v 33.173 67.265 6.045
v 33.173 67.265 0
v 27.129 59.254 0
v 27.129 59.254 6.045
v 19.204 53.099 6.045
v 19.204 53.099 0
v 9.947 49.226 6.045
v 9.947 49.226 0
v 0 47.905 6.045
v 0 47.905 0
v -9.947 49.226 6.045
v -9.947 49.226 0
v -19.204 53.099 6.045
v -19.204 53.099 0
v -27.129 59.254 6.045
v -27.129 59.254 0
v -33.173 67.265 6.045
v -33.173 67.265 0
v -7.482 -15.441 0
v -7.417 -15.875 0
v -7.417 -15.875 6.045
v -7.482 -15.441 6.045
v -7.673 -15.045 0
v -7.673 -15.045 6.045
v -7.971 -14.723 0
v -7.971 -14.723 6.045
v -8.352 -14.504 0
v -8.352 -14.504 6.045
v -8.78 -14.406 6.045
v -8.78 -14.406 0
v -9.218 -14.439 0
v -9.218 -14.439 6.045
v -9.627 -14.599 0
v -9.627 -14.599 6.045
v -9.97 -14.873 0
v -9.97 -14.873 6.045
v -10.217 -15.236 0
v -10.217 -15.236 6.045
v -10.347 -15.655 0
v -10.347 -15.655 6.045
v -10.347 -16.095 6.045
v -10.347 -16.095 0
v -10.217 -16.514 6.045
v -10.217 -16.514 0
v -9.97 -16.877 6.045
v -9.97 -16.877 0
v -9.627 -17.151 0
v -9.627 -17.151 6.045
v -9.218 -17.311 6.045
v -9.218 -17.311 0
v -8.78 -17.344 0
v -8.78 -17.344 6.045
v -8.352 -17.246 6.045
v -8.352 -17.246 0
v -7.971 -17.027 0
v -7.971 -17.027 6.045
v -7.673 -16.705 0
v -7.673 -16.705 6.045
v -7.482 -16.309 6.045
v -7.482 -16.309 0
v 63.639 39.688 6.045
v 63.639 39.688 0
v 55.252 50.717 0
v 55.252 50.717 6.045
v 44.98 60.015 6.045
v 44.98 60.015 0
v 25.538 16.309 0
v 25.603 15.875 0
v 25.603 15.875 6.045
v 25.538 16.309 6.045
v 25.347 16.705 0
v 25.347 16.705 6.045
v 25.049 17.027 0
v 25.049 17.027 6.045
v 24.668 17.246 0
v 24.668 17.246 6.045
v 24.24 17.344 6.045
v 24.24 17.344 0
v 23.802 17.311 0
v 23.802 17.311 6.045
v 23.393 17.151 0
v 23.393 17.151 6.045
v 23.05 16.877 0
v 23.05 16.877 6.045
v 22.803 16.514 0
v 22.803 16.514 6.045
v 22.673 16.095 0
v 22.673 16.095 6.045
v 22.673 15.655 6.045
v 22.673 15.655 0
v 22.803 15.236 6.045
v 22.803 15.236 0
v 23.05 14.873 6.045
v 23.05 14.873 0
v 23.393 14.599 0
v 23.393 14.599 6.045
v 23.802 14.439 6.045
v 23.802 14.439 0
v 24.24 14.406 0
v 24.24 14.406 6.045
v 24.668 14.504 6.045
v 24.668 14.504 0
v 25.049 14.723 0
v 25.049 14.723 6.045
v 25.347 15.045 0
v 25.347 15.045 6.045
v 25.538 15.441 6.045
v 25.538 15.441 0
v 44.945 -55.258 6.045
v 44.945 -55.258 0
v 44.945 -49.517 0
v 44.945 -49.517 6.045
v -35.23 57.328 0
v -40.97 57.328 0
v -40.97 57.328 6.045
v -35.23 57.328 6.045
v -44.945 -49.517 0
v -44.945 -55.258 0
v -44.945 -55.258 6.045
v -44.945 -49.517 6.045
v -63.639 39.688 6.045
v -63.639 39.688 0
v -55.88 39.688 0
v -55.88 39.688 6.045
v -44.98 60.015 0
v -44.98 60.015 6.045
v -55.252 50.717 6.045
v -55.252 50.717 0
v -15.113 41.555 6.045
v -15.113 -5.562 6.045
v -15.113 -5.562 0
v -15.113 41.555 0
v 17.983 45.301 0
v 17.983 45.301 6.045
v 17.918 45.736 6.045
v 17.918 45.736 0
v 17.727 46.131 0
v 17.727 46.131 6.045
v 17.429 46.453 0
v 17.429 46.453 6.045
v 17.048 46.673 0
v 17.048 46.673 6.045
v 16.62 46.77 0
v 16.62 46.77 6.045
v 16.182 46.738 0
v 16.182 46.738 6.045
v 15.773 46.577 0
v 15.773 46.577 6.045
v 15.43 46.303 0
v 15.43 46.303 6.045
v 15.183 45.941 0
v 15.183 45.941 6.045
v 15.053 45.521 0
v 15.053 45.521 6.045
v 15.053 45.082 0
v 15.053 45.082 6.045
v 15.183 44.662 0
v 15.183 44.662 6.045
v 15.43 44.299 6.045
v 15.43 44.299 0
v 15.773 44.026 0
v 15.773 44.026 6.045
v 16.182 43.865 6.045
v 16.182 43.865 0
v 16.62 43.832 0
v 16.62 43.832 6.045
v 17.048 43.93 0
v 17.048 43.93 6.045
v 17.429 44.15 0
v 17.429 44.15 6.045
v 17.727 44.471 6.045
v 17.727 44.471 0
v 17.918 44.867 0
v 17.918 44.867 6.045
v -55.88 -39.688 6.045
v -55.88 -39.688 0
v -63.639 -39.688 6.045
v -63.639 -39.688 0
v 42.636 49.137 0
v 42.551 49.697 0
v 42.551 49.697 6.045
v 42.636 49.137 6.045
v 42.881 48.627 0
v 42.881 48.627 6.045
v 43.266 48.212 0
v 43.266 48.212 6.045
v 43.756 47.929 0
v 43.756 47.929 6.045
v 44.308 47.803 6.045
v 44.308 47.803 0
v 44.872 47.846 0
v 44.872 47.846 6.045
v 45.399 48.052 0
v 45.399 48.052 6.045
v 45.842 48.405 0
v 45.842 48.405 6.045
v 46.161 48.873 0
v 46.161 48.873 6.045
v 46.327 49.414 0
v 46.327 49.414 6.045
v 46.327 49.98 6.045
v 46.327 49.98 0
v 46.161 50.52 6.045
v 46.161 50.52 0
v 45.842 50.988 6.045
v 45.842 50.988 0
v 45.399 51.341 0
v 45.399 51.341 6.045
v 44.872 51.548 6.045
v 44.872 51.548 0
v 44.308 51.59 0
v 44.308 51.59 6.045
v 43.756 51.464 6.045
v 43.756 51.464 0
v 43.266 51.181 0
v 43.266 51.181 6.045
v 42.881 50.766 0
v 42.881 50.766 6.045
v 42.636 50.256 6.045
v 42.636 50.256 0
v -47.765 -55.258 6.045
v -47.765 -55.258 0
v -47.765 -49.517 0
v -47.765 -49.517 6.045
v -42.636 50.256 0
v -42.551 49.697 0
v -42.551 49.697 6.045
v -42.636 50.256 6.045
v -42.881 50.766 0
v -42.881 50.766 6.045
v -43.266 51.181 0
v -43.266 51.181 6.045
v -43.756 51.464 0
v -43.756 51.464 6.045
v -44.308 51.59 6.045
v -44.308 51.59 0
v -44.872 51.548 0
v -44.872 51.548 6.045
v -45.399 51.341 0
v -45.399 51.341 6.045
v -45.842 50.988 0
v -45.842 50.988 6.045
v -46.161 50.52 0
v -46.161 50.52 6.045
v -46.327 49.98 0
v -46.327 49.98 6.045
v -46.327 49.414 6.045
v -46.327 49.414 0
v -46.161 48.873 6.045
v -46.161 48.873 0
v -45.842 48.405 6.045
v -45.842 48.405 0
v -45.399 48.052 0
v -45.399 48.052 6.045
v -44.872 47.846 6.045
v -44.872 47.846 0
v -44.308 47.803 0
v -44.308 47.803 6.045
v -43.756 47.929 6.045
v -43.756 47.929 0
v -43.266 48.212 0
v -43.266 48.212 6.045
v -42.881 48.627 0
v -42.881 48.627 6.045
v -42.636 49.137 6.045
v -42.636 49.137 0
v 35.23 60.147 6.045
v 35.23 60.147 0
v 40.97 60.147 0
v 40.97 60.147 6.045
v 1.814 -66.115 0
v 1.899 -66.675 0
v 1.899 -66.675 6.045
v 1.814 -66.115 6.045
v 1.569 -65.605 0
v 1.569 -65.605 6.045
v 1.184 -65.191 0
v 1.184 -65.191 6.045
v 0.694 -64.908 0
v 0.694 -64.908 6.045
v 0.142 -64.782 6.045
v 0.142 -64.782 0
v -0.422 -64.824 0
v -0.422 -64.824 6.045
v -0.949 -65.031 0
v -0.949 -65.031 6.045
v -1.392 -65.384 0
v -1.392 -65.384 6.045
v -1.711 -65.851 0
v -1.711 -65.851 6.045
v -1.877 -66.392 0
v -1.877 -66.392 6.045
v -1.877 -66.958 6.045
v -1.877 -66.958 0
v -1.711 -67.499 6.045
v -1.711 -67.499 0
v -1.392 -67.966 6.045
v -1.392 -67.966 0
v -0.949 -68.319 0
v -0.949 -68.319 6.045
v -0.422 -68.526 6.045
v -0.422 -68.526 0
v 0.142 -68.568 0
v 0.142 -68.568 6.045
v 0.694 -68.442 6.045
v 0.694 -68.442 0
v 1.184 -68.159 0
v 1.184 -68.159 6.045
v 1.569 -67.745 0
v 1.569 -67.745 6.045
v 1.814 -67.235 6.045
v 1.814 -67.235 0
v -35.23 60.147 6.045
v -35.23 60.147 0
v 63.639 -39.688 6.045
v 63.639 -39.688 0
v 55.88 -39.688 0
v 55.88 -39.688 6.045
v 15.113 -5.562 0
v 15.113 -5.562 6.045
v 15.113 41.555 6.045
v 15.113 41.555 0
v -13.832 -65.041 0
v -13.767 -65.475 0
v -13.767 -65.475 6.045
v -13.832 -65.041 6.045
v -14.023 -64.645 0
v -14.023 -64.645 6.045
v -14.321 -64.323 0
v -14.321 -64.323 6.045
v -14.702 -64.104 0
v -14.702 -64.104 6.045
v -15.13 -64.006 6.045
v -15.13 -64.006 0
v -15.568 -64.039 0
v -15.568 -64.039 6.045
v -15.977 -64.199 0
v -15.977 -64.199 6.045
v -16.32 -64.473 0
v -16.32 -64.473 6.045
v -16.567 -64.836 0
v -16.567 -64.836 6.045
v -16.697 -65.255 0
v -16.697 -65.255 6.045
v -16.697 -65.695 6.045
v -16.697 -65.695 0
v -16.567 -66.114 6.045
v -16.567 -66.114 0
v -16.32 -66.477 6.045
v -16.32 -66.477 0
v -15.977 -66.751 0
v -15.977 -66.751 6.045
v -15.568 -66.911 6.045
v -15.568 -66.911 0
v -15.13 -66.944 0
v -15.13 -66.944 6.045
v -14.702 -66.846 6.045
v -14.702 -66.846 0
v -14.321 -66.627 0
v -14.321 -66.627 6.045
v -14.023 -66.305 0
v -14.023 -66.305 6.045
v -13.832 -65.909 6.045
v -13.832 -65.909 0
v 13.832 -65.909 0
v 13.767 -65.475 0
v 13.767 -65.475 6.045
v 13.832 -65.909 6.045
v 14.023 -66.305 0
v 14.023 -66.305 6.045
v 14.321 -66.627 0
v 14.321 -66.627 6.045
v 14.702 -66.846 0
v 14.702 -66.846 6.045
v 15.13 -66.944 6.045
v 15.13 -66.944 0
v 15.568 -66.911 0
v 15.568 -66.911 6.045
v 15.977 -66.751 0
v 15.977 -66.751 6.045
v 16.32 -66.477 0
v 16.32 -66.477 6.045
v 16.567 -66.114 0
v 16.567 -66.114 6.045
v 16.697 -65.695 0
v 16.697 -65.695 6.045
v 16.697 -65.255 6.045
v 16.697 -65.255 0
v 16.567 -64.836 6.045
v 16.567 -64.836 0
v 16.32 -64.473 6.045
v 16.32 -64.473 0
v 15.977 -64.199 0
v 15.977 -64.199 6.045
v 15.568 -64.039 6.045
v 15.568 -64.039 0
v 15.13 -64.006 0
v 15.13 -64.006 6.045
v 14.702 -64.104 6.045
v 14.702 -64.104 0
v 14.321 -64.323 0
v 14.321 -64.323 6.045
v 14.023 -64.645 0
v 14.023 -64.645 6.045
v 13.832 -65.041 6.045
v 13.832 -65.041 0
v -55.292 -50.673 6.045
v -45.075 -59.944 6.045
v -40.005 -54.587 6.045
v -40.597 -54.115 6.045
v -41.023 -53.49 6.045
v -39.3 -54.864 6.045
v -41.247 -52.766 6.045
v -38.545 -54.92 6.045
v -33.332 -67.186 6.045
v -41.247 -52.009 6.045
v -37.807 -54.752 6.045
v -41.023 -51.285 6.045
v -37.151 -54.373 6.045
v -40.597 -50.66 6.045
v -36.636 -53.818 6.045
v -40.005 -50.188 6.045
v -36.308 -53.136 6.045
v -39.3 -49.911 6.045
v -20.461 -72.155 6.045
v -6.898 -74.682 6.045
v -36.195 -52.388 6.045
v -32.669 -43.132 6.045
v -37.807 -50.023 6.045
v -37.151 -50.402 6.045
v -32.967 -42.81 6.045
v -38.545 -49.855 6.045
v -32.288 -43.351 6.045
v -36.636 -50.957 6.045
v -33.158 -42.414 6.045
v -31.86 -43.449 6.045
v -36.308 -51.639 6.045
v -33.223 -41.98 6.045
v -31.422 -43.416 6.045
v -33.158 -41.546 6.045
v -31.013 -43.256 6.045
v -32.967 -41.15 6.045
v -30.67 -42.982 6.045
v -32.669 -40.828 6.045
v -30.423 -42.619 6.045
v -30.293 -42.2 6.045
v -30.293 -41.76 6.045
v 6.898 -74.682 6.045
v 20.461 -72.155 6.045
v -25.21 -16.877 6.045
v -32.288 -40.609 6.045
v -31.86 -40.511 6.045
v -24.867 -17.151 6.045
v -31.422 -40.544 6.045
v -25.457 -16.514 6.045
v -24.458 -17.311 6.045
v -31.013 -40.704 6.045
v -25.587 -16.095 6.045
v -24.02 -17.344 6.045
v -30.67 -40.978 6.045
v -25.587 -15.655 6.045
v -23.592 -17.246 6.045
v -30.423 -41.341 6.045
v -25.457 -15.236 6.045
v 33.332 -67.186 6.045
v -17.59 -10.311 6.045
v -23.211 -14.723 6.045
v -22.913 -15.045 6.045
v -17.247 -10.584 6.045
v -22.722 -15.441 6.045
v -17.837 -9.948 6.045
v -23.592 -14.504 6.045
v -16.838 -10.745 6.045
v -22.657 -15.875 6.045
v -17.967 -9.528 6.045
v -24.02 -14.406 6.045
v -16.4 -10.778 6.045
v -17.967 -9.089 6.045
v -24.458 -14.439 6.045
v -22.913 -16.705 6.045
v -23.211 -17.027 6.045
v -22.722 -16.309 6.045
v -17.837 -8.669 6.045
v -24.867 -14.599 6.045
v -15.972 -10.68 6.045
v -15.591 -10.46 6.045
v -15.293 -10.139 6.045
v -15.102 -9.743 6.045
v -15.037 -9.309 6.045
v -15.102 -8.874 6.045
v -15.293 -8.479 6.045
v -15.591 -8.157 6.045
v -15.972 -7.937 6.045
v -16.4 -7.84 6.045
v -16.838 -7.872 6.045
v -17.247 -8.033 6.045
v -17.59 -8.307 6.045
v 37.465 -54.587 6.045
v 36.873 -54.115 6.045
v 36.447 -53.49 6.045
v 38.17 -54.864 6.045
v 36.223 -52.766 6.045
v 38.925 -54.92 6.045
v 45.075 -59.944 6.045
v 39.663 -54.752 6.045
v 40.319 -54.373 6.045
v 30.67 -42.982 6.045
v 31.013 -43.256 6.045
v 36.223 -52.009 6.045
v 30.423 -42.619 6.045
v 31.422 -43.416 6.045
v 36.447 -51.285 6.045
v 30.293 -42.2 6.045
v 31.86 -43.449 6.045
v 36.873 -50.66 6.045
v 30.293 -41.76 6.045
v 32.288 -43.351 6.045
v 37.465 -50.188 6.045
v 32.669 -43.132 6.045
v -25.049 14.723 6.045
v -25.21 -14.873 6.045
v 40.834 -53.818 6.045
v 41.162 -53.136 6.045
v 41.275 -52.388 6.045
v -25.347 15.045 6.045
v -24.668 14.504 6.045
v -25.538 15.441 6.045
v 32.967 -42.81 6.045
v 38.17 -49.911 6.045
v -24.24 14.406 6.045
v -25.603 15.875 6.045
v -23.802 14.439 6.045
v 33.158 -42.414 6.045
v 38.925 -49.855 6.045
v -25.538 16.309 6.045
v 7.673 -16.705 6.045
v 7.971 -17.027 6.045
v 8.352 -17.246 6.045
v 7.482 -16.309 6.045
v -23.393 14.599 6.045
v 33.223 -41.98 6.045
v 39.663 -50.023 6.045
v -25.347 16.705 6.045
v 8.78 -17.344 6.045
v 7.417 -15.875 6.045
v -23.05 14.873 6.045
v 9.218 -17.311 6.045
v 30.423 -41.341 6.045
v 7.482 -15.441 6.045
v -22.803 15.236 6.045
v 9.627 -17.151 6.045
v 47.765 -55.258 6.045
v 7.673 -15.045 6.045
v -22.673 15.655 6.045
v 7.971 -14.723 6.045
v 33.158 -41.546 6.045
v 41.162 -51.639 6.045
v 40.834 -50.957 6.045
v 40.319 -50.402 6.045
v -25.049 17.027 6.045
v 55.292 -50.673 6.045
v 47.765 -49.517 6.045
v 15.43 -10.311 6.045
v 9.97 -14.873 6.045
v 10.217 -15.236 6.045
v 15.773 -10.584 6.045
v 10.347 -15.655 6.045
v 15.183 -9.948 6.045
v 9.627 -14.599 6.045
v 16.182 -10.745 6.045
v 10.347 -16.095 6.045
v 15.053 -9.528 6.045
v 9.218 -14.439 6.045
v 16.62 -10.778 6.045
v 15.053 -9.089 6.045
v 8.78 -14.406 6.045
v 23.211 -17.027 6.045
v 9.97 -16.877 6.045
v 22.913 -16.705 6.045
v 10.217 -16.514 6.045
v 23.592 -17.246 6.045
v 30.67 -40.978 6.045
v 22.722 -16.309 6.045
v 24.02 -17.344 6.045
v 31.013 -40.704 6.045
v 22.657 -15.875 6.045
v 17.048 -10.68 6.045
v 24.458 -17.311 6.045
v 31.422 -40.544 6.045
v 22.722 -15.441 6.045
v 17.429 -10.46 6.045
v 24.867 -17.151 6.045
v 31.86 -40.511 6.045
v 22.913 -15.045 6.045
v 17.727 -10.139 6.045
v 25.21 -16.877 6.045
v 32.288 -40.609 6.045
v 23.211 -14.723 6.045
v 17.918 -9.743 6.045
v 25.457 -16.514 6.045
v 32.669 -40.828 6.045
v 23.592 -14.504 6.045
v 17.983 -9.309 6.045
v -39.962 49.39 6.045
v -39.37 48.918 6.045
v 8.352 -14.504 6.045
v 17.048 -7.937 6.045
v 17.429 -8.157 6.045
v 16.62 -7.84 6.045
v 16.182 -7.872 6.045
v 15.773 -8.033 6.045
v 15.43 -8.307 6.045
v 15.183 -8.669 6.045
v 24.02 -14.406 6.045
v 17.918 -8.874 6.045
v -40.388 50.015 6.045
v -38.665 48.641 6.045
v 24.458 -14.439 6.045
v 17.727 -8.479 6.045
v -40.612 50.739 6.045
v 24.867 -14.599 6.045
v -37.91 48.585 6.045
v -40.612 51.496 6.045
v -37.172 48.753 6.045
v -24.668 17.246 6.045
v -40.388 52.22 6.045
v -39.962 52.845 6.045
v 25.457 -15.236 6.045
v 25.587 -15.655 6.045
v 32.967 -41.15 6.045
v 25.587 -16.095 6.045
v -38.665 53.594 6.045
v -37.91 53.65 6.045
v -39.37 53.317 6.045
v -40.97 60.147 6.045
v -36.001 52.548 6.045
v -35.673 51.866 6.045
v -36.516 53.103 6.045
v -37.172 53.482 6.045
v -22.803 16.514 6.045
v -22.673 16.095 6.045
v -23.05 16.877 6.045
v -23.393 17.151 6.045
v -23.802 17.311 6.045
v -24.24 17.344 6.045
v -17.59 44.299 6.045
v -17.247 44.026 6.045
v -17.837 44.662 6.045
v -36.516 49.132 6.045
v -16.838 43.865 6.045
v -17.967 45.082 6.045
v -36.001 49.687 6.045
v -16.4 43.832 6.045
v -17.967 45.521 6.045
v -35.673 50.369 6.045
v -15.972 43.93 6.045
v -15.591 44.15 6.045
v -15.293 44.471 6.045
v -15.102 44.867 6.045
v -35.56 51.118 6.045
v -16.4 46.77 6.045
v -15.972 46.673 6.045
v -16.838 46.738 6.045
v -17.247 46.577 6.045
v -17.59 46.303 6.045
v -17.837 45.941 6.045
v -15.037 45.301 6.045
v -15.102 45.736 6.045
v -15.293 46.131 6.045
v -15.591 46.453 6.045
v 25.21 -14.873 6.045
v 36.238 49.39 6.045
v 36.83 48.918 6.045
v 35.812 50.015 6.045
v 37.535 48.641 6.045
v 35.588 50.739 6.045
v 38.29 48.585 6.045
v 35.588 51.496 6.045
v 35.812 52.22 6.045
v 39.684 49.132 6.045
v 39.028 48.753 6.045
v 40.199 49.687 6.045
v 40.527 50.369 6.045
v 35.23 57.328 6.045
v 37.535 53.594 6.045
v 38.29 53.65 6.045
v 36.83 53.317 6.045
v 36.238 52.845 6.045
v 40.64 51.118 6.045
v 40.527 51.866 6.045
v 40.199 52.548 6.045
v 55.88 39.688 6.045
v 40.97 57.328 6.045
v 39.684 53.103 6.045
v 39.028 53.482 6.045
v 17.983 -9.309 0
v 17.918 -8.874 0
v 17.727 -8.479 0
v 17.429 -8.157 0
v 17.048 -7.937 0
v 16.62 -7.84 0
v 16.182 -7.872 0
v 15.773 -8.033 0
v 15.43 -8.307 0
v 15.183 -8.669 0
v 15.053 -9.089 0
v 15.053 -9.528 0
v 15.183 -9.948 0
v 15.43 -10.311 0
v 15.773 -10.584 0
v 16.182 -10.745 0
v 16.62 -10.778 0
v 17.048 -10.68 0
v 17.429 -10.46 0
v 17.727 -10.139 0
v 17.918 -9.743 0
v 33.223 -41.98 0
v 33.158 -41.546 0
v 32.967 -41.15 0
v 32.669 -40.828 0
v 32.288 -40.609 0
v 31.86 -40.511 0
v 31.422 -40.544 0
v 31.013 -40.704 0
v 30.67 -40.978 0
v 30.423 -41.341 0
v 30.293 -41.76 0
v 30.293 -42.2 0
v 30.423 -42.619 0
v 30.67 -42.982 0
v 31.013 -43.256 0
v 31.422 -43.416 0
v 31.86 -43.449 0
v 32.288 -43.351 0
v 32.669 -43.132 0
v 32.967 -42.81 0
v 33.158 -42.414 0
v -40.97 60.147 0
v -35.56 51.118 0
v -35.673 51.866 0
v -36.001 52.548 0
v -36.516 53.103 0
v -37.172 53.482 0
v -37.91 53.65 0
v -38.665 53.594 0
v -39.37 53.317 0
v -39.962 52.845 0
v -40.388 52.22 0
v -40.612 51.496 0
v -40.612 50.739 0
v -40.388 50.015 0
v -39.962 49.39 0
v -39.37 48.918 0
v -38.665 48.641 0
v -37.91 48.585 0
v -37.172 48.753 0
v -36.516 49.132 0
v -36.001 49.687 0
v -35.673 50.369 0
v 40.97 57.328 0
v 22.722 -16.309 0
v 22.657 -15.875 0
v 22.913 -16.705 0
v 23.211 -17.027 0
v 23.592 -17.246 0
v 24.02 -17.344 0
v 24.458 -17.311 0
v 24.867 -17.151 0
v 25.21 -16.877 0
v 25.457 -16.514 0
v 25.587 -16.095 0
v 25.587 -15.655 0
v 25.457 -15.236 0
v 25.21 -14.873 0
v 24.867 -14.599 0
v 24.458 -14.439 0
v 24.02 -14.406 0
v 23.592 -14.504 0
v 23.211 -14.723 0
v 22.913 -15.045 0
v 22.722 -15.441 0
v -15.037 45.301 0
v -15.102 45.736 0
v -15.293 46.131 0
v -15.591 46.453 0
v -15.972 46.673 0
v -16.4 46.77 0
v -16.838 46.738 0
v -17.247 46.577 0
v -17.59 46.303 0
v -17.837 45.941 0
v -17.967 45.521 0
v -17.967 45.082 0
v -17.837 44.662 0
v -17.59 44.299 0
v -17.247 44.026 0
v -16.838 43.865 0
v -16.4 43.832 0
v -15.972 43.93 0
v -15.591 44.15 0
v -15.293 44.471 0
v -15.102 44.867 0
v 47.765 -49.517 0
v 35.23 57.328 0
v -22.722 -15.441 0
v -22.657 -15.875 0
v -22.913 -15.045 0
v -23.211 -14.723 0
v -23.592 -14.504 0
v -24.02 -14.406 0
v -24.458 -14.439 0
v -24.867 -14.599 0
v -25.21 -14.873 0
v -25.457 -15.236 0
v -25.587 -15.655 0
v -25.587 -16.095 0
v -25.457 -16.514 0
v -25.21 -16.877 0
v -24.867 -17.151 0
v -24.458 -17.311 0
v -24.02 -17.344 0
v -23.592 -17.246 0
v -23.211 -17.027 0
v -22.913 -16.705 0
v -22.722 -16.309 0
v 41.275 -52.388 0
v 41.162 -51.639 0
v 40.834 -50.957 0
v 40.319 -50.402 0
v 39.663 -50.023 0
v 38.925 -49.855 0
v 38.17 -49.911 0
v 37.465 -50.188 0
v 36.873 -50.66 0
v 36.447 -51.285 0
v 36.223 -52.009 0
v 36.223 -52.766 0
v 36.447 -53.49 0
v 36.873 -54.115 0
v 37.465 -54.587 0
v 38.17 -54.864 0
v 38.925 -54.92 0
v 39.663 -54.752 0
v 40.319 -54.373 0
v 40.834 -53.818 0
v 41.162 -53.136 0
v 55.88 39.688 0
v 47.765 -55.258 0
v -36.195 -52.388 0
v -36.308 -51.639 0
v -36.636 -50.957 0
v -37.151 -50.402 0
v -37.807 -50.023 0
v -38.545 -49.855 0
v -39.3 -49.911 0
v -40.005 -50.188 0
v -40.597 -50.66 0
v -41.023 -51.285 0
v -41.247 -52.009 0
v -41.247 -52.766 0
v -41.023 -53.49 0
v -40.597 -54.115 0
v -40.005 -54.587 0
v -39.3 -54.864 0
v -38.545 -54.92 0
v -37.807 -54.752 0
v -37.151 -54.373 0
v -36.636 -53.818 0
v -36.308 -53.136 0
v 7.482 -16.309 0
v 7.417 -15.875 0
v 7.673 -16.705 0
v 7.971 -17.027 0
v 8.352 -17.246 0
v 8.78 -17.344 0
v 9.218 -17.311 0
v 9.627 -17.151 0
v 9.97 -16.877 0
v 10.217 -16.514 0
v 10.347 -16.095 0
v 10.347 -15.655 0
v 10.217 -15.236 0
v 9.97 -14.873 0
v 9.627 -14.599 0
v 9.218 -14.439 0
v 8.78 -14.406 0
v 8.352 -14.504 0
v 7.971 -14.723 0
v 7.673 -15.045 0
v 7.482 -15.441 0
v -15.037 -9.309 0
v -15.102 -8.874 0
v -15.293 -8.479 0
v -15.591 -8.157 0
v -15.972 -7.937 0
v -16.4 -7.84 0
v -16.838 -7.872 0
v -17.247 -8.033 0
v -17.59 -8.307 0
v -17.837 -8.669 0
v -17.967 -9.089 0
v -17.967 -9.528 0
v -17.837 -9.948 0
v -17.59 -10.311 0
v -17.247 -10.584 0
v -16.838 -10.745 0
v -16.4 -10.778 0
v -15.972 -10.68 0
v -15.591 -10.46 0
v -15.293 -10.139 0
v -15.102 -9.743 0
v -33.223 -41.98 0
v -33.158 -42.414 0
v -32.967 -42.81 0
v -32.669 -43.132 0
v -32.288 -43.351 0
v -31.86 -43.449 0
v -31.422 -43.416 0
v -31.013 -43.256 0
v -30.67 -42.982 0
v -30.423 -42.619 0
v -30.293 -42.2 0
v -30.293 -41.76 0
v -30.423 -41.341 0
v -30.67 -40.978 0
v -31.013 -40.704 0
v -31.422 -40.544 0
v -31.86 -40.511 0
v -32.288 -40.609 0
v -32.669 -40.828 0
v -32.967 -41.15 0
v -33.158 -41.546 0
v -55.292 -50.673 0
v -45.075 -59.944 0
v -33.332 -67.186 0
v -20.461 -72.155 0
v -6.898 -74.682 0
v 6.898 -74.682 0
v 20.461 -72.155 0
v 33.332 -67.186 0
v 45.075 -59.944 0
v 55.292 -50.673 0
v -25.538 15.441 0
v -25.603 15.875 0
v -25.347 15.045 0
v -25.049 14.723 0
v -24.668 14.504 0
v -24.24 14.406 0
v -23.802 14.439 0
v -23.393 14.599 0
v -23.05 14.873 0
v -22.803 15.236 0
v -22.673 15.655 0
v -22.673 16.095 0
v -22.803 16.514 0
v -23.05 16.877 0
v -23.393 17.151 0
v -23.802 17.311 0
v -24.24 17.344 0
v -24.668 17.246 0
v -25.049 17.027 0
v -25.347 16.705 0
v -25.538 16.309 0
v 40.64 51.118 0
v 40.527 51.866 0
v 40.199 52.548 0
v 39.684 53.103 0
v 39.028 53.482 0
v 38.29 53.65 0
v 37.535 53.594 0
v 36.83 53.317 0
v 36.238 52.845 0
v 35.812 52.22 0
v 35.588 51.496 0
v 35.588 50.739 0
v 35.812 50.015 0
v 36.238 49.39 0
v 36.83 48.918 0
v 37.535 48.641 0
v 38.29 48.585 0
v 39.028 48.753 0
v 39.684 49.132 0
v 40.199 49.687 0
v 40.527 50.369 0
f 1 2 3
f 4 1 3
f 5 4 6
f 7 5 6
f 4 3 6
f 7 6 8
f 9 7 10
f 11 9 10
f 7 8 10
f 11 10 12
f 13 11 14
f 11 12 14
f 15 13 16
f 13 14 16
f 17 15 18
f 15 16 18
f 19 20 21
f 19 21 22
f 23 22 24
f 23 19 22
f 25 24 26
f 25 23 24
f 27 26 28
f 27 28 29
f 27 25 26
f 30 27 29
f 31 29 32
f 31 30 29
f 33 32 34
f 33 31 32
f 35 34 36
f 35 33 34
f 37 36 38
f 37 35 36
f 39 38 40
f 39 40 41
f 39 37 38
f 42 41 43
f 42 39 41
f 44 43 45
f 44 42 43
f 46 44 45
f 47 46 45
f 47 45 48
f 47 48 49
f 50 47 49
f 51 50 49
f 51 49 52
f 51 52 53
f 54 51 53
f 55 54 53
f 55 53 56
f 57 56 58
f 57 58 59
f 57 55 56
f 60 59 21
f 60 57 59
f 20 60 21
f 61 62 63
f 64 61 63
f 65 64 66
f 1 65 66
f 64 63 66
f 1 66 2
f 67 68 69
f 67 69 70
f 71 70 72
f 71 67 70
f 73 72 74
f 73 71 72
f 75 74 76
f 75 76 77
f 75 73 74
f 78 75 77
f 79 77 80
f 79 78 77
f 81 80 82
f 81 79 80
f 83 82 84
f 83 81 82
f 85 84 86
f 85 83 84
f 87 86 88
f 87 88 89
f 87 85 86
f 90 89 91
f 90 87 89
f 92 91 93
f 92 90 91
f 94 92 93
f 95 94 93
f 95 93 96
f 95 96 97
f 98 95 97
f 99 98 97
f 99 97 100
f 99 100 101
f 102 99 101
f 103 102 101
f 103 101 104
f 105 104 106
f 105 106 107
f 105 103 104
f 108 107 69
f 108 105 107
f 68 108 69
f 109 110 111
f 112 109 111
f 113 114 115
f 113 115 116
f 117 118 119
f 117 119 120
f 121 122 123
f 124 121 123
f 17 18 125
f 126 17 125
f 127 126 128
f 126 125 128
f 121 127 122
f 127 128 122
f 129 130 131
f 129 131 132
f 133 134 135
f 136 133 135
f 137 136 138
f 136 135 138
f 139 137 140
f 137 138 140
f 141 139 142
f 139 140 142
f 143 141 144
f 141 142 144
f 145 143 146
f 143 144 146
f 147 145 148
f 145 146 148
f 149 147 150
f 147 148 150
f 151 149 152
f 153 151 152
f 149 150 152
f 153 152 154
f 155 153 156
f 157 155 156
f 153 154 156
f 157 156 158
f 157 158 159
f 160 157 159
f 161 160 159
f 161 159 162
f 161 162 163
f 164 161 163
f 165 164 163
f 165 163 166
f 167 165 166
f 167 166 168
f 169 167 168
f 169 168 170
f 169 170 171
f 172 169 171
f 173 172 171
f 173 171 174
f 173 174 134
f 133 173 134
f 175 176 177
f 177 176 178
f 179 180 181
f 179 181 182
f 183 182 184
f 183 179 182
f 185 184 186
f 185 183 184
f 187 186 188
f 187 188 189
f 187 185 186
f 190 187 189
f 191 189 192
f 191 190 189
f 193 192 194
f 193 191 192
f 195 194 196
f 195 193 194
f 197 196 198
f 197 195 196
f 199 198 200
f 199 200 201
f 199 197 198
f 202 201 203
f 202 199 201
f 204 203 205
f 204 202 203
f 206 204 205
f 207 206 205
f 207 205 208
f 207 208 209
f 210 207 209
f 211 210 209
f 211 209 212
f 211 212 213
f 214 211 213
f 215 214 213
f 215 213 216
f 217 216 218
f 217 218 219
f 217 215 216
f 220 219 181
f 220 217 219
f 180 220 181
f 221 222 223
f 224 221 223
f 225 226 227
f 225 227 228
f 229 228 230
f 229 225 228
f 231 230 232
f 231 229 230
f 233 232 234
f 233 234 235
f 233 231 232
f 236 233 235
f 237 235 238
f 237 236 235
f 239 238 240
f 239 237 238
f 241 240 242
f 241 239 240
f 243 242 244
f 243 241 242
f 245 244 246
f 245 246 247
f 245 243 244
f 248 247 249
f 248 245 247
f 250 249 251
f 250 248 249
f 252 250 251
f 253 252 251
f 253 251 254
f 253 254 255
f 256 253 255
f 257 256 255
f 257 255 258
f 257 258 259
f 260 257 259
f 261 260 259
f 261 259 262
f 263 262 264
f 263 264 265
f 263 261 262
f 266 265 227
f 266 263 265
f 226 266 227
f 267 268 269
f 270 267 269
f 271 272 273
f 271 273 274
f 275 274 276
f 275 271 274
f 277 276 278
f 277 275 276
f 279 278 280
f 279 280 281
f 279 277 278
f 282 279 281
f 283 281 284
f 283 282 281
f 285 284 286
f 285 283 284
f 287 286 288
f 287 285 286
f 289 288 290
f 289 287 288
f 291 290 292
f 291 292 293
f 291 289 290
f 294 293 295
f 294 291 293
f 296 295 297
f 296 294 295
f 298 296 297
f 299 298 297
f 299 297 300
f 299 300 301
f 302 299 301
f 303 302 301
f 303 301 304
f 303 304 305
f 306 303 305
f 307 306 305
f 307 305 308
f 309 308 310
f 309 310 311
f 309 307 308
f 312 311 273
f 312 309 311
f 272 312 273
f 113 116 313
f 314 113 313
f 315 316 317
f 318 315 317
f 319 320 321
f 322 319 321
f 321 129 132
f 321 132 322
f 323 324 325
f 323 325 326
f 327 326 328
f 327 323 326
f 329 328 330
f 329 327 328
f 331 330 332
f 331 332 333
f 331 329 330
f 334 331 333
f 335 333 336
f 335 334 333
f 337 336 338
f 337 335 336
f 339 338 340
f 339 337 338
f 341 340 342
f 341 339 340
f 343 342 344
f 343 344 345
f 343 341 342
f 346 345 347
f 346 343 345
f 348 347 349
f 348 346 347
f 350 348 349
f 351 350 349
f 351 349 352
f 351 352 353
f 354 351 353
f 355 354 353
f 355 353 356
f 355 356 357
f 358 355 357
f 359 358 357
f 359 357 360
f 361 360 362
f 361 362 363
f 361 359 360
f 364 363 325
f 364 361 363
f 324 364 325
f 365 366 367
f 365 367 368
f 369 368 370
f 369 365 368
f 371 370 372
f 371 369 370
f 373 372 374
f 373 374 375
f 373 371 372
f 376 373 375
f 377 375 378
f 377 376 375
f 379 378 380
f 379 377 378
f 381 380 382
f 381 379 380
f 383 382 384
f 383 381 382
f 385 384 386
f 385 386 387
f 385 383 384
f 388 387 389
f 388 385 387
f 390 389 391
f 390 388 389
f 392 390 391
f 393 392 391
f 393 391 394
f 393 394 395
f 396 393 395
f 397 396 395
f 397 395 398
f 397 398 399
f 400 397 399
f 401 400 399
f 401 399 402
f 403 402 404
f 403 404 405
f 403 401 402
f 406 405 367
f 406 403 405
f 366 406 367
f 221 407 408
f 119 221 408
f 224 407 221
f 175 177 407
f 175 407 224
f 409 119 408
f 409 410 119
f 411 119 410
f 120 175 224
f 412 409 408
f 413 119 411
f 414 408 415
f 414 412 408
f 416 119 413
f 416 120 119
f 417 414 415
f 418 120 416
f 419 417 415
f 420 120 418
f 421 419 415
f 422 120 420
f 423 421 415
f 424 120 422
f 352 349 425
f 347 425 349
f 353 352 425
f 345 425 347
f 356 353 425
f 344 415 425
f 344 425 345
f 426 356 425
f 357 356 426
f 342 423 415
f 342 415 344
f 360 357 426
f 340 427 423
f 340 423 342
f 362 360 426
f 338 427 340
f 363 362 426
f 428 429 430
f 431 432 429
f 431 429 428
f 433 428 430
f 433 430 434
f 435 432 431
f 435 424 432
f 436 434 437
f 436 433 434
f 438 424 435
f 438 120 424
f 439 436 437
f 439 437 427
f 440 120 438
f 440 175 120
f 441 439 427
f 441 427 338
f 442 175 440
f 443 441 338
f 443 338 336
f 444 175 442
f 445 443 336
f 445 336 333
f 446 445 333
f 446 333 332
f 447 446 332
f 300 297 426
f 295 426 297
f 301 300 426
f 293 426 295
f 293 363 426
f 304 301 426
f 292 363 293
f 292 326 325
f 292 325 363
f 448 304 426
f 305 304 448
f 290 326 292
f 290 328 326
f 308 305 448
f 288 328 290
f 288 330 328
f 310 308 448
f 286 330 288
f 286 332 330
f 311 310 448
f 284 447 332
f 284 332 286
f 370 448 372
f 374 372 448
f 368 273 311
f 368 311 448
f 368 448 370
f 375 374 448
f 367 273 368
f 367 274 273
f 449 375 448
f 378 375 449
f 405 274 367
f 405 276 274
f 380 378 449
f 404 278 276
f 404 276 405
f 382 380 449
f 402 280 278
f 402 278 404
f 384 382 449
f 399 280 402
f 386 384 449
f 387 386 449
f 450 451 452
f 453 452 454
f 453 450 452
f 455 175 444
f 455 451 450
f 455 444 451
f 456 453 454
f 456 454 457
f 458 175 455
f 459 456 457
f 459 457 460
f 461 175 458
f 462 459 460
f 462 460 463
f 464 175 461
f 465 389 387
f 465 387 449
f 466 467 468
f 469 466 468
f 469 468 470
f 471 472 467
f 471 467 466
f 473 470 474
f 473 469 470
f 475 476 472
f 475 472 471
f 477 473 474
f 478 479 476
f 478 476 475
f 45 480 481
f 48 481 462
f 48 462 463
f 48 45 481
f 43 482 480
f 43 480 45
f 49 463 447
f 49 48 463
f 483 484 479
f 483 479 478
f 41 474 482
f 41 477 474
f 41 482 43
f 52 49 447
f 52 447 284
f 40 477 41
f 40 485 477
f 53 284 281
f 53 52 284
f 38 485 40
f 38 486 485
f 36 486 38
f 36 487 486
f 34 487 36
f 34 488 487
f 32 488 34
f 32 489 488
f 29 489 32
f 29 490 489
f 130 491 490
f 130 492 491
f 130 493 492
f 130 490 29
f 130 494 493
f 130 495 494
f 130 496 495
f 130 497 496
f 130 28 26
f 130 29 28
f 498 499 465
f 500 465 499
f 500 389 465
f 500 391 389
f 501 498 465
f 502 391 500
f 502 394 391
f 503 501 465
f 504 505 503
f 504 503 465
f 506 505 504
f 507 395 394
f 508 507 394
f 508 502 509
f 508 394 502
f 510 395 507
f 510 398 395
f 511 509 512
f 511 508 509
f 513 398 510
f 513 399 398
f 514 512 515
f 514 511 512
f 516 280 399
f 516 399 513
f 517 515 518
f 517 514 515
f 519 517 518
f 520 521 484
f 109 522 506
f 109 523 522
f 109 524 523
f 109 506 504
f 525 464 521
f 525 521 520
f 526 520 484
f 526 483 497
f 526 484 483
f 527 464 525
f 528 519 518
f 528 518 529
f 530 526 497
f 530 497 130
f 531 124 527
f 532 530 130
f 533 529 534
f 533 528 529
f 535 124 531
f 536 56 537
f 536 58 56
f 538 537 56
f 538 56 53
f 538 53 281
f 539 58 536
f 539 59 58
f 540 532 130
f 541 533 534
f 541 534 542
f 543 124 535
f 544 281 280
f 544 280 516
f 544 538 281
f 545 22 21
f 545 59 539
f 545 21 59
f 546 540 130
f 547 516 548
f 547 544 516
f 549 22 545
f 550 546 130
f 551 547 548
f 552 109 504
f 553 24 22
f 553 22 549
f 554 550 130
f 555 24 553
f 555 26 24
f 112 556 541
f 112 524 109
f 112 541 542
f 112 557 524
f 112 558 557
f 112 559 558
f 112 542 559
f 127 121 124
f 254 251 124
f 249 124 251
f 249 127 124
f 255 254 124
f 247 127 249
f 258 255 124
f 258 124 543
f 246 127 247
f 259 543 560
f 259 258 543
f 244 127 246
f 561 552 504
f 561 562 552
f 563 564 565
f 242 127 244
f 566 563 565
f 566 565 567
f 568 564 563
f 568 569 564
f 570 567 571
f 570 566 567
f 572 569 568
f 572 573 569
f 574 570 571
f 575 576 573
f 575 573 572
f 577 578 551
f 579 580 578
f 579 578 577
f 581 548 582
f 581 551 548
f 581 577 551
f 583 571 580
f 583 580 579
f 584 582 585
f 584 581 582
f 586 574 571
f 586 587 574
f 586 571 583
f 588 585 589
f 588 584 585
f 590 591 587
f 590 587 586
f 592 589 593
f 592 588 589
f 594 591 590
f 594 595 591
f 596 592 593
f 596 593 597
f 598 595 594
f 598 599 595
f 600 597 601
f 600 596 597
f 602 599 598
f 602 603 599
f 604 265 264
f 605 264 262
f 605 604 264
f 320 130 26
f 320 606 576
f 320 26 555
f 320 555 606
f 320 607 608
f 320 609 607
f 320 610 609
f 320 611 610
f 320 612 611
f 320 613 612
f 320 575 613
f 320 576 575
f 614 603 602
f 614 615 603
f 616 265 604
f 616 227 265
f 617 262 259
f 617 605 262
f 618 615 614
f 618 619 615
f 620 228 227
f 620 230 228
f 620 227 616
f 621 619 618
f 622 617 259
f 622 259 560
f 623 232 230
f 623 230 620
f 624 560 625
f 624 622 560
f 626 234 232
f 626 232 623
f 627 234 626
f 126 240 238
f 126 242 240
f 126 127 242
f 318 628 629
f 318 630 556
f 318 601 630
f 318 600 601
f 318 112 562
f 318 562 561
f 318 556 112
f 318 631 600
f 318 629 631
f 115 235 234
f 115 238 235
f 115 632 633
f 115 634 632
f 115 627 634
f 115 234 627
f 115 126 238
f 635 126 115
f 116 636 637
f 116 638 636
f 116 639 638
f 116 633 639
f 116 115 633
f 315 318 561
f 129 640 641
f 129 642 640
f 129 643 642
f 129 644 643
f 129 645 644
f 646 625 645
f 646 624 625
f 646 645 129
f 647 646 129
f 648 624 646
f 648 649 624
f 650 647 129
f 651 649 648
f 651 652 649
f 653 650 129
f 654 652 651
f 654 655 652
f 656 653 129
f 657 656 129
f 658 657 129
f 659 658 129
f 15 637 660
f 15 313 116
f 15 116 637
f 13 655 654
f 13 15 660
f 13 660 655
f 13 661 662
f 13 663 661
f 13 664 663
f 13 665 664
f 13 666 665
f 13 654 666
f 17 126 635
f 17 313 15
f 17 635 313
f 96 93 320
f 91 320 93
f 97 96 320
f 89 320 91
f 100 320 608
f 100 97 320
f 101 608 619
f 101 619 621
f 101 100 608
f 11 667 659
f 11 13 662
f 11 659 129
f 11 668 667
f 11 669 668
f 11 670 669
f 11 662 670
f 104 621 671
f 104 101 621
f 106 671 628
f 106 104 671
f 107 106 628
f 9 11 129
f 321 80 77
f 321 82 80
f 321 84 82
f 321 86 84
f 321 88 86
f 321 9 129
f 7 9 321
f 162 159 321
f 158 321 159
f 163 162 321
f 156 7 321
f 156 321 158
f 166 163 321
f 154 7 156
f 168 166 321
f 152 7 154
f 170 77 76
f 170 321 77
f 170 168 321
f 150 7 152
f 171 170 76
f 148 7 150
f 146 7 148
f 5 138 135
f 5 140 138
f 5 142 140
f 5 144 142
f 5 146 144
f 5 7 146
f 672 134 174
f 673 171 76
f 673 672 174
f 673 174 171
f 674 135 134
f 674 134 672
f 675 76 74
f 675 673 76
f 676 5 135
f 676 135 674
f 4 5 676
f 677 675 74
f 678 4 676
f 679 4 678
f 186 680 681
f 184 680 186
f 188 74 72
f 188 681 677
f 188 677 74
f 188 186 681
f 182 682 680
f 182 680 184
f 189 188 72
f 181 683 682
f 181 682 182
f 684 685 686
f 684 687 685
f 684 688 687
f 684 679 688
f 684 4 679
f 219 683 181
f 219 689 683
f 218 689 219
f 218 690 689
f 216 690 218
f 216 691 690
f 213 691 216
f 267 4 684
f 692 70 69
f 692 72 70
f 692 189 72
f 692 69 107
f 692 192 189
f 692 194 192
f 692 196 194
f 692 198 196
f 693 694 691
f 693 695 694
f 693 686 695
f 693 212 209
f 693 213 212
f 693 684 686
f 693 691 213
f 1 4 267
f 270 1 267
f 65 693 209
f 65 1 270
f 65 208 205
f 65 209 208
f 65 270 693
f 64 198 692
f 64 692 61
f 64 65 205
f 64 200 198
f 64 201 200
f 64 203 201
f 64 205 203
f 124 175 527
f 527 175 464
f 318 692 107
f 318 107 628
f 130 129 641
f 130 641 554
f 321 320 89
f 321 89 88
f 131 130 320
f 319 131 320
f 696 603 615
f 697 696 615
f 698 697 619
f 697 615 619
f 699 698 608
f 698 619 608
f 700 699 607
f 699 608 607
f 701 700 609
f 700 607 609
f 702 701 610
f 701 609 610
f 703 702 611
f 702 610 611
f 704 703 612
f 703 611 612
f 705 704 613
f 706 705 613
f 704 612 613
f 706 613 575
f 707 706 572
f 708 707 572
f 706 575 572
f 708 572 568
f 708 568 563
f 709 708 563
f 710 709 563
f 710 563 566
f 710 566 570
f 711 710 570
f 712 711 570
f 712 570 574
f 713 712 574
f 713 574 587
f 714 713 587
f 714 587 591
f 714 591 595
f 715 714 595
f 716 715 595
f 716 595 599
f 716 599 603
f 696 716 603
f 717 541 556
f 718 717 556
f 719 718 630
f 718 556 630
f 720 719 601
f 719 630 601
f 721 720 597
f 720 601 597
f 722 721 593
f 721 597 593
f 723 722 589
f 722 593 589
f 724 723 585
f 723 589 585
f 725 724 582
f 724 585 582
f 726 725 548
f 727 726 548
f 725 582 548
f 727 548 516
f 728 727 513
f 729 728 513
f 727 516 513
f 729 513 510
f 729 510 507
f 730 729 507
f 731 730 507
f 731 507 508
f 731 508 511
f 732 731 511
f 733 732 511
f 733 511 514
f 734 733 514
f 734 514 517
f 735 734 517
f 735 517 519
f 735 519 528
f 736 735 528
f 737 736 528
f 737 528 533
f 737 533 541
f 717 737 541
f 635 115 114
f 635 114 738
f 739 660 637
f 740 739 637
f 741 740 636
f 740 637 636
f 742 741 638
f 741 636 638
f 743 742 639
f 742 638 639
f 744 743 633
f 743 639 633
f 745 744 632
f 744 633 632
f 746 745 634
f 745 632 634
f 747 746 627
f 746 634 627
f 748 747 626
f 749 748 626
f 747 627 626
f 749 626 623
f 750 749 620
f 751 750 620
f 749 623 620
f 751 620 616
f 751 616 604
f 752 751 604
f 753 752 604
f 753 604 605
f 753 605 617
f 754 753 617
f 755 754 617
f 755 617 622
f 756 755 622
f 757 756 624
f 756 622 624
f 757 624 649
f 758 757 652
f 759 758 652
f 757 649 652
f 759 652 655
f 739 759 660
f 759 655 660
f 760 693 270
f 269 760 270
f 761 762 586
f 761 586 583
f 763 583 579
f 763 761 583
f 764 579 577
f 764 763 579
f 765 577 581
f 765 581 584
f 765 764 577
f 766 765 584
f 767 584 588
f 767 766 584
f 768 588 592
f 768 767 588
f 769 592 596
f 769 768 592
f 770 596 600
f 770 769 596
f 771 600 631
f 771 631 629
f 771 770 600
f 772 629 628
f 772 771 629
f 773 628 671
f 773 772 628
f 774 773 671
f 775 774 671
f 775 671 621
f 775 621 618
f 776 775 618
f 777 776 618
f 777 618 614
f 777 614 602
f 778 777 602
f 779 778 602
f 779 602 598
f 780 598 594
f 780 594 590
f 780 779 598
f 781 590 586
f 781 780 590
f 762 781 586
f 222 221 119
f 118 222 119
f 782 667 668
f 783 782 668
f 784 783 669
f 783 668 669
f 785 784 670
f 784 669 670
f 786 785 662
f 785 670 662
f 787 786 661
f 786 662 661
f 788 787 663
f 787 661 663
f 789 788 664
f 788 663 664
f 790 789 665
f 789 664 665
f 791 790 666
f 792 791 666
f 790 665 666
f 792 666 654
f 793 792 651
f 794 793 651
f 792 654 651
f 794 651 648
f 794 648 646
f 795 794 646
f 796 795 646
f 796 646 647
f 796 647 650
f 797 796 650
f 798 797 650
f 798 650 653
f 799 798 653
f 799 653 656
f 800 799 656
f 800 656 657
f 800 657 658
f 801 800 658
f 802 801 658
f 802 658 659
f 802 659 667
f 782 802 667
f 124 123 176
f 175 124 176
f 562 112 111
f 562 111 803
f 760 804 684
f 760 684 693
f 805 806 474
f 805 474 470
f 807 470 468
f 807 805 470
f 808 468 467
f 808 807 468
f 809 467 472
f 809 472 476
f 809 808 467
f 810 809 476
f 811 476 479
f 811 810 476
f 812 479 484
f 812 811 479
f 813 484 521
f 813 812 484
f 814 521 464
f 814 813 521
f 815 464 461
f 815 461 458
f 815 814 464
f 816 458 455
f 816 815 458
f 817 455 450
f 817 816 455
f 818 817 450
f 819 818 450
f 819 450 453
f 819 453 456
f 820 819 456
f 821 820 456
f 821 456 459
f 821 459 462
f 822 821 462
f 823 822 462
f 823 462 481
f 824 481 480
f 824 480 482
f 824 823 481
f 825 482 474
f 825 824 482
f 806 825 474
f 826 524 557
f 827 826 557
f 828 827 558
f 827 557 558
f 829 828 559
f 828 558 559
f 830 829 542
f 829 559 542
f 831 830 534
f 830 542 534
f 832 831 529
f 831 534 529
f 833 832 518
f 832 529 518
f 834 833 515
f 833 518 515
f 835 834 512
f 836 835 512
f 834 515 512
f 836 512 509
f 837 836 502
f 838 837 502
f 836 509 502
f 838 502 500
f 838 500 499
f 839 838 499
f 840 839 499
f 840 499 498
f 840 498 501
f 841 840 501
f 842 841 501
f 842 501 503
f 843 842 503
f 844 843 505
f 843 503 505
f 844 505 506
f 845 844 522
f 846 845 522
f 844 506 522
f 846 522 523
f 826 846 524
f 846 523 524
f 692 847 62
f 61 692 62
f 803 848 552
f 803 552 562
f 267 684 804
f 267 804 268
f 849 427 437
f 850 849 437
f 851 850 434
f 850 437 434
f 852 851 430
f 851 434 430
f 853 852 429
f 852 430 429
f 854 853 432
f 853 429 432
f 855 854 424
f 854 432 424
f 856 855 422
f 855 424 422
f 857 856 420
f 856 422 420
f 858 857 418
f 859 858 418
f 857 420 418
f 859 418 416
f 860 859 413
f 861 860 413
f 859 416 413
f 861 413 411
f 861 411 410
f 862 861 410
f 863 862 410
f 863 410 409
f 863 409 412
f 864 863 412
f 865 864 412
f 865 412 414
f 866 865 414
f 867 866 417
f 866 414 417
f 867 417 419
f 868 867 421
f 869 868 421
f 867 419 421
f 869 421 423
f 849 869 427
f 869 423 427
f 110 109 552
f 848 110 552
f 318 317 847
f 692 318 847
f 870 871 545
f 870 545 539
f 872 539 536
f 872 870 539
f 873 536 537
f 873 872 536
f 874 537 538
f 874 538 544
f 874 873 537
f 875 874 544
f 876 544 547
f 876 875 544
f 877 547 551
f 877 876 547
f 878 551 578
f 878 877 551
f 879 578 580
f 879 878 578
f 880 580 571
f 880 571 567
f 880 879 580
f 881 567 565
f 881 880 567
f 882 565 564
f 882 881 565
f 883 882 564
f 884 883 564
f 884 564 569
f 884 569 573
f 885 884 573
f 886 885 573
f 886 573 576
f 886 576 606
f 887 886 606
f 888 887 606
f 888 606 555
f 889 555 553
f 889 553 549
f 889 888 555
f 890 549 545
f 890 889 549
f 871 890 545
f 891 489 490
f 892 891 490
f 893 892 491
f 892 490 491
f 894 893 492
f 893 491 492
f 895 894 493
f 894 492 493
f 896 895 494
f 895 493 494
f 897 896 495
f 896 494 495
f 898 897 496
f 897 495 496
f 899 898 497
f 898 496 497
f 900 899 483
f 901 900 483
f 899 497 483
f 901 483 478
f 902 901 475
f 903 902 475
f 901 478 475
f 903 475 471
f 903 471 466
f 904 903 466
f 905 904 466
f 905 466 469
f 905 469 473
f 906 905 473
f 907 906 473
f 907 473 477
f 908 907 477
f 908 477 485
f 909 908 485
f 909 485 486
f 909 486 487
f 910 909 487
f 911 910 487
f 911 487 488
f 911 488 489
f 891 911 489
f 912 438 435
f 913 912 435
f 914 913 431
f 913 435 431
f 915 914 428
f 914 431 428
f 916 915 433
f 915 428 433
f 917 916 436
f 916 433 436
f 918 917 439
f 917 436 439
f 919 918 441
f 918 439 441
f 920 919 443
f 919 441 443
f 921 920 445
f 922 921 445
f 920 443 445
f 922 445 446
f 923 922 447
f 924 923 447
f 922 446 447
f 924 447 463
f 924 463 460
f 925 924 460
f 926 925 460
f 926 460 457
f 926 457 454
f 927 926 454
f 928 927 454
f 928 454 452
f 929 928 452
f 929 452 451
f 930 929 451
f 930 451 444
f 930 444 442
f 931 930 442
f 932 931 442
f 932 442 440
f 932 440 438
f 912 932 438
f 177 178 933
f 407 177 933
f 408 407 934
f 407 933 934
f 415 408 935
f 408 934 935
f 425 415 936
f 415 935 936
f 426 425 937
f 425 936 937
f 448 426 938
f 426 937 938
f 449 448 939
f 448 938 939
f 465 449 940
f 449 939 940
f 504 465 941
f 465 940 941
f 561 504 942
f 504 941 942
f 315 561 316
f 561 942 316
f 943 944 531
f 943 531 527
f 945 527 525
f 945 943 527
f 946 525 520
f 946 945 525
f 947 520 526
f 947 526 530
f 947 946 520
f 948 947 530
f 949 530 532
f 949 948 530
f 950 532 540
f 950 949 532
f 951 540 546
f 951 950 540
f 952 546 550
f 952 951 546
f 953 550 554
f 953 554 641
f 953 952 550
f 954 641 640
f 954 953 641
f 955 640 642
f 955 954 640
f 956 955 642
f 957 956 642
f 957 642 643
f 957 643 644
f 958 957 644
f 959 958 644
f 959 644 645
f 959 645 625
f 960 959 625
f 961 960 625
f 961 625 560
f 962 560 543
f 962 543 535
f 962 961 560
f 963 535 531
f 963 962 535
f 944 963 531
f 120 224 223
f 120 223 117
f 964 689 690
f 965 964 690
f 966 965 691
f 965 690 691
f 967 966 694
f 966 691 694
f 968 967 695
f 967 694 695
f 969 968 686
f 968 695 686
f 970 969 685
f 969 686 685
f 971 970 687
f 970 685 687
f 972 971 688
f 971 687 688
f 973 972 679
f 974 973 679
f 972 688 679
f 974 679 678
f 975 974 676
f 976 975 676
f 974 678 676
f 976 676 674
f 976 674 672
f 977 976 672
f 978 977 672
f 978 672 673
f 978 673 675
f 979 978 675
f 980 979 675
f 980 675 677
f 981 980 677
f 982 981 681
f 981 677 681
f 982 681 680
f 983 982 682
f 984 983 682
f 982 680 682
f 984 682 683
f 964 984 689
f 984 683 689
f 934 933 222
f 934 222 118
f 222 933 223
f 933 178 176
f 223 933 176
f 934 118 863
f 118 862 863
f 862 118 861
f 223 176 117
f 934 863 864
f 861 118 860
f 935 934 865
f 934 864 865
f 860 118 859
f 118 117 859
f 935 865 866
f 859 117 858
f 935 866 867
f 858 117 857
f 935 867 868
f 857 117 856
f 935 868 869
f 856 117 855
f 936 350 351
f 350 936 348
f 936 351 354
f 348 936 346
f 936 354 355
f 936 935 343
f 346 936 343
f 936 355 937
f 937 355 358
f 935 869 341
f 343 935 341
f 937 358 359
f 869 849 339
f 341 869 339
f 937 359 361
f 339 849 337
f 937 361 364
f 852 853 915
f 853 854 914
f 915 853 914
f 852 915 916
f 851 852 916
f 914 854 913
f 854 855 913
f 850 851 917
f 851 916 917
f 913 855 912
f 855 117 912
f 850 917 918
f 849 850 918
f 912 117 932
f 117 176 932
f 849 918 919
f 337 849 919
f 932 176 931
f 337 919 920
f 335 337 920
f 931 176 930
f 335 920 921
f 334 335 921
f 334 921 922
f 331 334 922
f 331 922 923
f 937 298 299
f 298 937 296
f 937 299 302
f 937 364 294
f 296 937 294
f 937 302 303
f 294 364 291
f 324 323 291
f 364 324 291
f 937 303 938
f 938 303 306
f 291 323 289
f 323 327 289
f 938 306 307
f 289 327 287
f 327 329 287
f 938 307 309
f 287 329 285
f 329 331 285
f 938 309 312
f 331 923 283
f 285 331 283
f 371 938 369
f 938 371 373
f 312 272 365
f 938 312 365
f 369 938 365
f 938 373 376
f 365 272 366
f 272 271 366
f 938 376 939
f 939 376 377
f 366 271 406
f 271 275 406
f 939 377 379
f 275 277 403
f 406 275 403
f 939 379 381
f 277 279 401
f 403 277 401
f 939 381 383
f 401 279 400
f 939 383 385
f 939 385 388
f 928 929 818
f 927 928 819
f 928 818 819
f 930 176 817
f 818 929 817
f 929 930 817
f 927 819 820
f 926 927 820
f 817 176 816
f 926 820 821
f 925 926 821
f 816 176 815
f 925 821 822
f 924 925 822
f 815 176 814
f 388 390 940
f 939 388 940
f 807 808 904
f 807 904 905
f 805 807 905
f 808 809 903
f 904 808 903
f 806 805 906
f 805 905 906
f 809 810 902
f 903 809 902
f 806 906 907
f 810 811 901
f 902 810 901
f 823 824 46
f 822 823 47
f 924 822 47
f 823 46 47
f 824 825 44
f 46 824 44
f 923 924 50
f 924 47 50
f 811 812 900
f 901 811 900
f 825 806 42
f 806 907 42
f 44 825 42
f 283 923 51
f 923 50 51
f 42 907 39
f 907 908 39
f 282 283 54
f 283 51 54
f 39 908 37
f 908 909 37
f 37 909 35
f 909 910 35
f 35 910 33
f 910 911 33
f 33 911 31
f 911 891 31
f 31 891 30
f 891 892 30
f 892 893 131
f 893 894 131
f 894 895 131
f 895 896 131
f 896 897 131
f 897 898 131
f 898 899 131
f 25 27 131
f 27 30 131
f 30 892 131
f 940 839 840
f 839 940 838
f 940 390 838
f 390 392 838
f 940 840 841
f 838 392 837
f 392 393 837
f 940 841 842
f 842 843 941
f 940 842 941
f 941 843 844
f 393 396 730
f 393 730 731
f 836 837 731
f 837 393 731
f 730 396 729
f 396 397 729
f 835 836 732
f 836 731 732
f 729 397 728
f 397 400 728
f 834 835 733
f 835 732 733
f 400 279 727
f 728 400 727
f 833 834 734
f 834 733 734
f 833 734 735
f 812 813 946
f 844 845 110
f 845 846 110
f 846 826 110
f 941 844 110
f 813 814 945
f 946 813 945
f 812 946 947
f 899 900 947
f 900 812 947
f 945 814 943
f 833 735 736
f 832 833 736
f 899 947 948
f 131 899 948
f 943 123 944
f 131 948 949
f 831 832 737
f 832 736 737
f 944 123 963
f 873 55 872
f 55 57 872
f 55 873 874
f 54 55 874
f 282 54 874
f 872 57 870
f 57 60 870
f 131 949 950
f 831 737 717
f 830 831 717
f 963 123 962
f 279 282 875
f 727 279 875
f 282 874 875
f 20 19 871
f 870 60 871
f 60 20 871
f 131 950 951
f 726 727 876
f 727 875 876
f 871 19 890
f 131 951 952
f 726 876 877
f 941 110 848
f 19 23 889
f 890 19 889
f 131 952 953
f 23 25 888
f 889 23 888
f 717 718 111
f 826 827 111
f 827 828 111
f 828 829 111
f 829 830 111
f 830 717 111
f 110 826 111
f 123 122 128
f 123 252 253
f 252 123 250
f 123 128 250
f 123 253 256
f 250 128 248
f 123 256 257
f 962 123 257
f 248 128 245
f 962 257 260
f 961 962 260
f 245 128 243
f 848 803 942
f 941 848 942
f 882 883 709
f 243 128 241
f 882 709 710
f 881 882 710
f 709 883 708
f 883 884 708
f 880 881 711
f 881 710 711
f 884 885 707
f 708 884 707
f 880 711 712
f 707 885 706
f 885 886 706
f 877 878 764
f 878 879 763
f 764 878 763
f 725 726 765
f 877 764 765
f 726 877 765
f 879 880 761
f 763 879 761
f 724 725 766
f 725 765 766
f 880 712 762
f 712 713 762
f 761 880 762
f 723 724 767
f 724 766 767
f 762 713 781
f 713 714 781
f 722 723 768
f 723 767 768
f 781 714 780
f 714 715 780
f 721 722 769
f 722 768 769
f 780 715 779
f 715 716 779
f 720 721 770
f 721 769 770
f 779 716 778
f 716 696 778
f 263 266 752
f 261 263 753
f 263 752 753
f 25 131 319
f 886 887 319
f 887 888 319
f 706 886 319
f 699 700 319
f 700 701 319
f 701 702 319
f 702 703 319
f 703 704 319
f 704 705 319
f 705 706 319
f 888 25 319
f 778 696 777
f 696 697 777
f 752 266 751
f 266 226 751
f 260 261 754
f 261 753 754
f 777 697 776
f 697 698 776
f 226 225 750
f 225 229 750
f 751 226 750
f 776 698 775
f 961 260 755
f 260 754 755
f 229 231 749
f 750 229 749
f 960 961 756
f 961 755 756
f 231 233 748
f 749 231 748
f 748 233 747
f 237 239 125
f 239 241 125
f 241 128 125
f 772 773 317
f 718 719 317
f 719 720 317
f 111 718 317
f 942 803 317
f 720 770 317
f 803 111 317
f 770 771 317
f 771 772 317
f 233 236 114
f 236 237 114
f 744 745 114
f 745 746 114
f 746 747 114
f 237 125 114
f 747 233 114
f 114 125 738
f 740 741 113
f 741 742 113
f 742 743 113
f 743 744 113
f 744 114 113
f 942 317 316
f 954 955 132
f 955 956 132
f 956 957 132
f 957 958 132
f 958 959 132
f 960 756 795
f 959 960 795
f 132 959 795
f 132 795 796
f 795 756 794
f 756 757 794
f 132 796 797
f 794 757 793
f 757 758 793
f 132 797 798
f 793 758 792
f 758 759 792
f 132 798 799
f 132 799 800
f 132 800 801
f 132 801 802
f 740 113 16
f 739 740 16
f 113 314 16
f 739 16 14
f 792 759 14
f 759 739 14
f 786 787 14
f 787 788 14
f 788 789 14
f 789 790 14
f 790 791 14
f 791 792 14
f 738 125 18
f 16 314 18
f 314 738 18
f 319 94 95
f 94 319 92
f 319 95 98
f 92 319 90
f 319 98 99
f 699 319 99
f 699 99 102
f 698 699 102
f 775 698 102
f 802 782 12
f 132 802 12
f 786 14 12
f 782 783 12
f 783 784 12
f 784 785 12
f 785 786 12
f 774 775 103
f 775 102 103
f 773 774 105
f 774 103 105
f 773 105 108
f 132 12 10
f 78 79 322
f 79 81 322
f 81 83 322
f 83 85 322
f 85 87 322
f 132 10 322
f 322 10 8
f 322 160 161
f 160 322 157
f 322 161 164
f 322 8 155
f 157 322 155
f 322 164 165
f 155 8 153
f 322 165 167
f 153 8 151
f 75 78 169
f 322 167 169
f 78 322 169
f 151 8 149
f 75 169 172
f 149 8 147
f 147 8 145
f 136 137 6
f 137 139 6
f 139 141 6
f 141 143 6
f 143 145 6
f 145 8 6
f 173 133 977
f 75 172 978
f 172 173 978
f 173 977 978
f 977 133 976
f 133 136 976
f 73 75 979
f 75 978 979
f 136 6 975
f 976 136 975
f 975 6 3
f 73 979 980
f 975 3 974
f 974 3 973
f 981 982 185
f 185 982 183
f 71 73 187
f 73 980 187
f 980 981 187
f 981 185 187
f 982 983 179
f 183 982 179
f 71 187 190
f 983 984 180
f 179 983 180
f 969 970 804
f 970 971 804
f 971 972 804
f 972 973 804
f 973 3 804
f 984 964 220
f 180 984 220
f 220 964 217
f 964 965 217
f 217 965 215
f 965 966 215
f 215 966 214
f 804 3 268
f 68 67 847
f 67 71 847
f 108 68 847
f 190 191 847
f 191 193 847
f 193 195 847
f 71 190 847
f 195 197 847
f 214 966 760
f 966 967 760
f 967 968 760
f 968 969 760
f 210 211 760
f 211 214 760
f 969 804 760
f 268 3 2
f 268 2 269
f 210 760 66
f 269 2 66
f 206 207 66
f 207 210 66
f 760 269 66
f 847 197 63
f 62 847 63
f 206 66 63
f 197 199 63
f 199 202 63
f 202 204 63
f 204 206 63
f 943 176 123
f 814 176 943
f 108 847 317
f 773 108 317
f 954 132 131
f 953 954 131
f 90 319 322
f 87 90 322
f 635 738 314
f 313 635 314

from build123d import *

# Parameters (mm, degrees)
SKETCH1_R           = 1.89865
SKETCH1_R_2         = 1.4732
BOSS_EXTRUDE3_DEPTH = 6.0452
SKETCH7_R           = 1.4732
CUT_EXTRUDE2_DEPTH  = 99.546673139
SKETCH9_R           = 1.4732
SKETCH9_W           = 30.226
SKETCH9_H           = 47.117
CUT_EXTRUDE3_DEPTH  = 14.732
SKETCH10_R          = 2.54
SKETCH10_W          = 5.7404
SKETCH10_H          = 2.8194
SKETCH10_W_2        = 2.8194
SKETCH10_H_2        = 5.7404
CUT_EXTRUDE4_DEPTH  = 6.0452


with BuildPart() as part:
    # Sketch1 → Boss-Extrude3 (new body)
    with BuildSketch(Plane.XY):
        with BuildLine():
            Line((-63.638843042, 39.6875), (-55.88, 39.6875))
            Line((-55.88, 39.6875), (-55.88, -39.6875))
            Line((-55.88, -39.6875), (-63.638843042, -39.6875))
            ThreePointArc((-63.638843042, -39.6875), (0, -75), (63.638843042, -39.6875))
            Line((63.638843042, -39.6875), (55.88, -39.6875))
            Line((55.88, -39.6875), (55.88, 39.6875))
            Line((55.88, 39.6875), (63.638843042, 39.6875))
            ThreePointArc((63.638843042, 39.6875), (50.33136084, 55.603544096), (33.172661219, 67.264957799))
            ThreePointArc((33.172661219, 67.264957799), (0, 47.904876359), (-33.172661219, 67.264957799))
            ThreePointArc((-33.172661219, 67.264957799), (-50.33136084, 55.603544096), (-63.638843042, 39.6875))
        make_face()
        with Locations((0, -66.675)):
            Circle(SKETCH1_R, mode=Mode.SUBTRACT)
        with Locations((-44.45, 49.6966108)):
            Circle(SKETCH1_R, mode=Mode.SUBTRACT)
        with Locations(Location((44.45, 49.6966108, 0), (0, 0, 180))):
            Circle(SKETCH1_R, mode=Mode.SUBTRACT)
        with Locations((-24.13, -15.875)):
            Circle(SKETCH1_R_2, mode=Mode.SUBTRACT)
        with Locations((-8.89, -15.875)):
            Circle(SKETCH1_R_2, mode=Mode.SUBTRACT)
        with Locations(Location((8.89, -15.875, 0), (0, 0, 180))):
            Circle(SKETCH1_R_2, mode=Mode.SUBTRACT)
        with Locations((-15.24, -65.475)):
            Circle(SKETCH1_R_2, mode=Mode.SUBTRACT)
        with Locations(Location((15.24, -65.475, 0), (0, 0, 180))):
            Circle(SKETCH1_R_2, mode=Mode.SUBTRACT)
        with Locations(Location((24.13, -15.875, 0), (0, 0, 180))):
            Circle(SKETCH1_R_2, mode=Mode.SUBTRACT)
        with Locations((8.89, 15.875)):
            Circle(SKETCH1_R_2, mode=Mode.SUBTRACT)
        with Locations(Location((-8.89, 15.875, 0), (0, 0, 180))):
            Circle(SKETCH1_R_2, mode=Mode.SUBTRACT)
        with Locations((24.13, 15.875)):
            Circle(SKETCH1_R_2, mode=Mode.SUBTRACT)
        with Locations(Location((-24.13, 15.875, 0), (0, 0, 180))):
            Circle(SKETCH1_R_2, mode=Mode.SUBTRACT)
    extrude(amount=BOSS_EXTRUDE3_DEPTH)

    # Sketch7 → Cut-Extrude2 (cut, through all)
    with BuildSketch(Plane.XY.offset(6.0452)):
        with Locations(Location((-31.75, -41.98, 0), (0, 0, 180))):
            Circle(SKETCH7_R)
        with Locations((31.75, -41.98)):
            Circle(SKETCH7_R)
    extrude(amount=-CUT_EXTRUDE2_DEPTH, mode=Mode.SUBTRACT)

    # Sketch9 → Cut-Extrude3 (cut)
    with BuildSketch(Plane.XY.offset(6.0452)):
        with Locations((-16.51, 45.301376359)):
            Circle(SKETCH9_R)
        with Locations((16.51, 45.301376359)):
            Circle(SKETCH9_R)
        with Locations((-16.51, -9.308623641)):
            Circle(SKETCH9_R)
        with Locations((16.51, -9.308623641)):
            Circle(SKETCH9_R)
        with Locations((0, 17.996376359)):
            Rectangle(SKETCH9_W, SKETCH9_H)
    extrude(amount=-CUT_EXTRUDE3_DEPTH, mode=Mode.SUBTRACT)

    # Sketch10 → Cut-Extrude4 (cut)
    with BuildSketch(Plane.XY.offset(6.0452)):
        with Locations((-38.735, -52.3875)):
            Circle(SKETCH10_R)
        with Locations((38.735, -52.3875)):
            Circle(SKETCH10_R)
        with Locations((-38.1, 51.1175)):
            Circle(SKETCH10_R)
        with Locations((38.1, 51.1175)):
            Circle(SKETCH10_R)
        with Locations((-38.1, 58.7375)):
            Rectangle(SKETCH10_W, SKETCH10_H)
        with Locations((38.1, 58.7375)):
            Rectangle(SKETCH10_W, SKETCH10_H)
        with Locations((-46.355, -52.3875)):
            Rectangle(SKETCH10_W_2, SKETCH10_H_2)
        with Locations((46.355, -52.3875)):
            Rectangle(SKETCH10_W_2, SKETCH10_H_2)
    extrude(amount=-CUT_EXTRUDE4_DEPTH, mode=Mode.SUBTRACT)


solid = part.part
